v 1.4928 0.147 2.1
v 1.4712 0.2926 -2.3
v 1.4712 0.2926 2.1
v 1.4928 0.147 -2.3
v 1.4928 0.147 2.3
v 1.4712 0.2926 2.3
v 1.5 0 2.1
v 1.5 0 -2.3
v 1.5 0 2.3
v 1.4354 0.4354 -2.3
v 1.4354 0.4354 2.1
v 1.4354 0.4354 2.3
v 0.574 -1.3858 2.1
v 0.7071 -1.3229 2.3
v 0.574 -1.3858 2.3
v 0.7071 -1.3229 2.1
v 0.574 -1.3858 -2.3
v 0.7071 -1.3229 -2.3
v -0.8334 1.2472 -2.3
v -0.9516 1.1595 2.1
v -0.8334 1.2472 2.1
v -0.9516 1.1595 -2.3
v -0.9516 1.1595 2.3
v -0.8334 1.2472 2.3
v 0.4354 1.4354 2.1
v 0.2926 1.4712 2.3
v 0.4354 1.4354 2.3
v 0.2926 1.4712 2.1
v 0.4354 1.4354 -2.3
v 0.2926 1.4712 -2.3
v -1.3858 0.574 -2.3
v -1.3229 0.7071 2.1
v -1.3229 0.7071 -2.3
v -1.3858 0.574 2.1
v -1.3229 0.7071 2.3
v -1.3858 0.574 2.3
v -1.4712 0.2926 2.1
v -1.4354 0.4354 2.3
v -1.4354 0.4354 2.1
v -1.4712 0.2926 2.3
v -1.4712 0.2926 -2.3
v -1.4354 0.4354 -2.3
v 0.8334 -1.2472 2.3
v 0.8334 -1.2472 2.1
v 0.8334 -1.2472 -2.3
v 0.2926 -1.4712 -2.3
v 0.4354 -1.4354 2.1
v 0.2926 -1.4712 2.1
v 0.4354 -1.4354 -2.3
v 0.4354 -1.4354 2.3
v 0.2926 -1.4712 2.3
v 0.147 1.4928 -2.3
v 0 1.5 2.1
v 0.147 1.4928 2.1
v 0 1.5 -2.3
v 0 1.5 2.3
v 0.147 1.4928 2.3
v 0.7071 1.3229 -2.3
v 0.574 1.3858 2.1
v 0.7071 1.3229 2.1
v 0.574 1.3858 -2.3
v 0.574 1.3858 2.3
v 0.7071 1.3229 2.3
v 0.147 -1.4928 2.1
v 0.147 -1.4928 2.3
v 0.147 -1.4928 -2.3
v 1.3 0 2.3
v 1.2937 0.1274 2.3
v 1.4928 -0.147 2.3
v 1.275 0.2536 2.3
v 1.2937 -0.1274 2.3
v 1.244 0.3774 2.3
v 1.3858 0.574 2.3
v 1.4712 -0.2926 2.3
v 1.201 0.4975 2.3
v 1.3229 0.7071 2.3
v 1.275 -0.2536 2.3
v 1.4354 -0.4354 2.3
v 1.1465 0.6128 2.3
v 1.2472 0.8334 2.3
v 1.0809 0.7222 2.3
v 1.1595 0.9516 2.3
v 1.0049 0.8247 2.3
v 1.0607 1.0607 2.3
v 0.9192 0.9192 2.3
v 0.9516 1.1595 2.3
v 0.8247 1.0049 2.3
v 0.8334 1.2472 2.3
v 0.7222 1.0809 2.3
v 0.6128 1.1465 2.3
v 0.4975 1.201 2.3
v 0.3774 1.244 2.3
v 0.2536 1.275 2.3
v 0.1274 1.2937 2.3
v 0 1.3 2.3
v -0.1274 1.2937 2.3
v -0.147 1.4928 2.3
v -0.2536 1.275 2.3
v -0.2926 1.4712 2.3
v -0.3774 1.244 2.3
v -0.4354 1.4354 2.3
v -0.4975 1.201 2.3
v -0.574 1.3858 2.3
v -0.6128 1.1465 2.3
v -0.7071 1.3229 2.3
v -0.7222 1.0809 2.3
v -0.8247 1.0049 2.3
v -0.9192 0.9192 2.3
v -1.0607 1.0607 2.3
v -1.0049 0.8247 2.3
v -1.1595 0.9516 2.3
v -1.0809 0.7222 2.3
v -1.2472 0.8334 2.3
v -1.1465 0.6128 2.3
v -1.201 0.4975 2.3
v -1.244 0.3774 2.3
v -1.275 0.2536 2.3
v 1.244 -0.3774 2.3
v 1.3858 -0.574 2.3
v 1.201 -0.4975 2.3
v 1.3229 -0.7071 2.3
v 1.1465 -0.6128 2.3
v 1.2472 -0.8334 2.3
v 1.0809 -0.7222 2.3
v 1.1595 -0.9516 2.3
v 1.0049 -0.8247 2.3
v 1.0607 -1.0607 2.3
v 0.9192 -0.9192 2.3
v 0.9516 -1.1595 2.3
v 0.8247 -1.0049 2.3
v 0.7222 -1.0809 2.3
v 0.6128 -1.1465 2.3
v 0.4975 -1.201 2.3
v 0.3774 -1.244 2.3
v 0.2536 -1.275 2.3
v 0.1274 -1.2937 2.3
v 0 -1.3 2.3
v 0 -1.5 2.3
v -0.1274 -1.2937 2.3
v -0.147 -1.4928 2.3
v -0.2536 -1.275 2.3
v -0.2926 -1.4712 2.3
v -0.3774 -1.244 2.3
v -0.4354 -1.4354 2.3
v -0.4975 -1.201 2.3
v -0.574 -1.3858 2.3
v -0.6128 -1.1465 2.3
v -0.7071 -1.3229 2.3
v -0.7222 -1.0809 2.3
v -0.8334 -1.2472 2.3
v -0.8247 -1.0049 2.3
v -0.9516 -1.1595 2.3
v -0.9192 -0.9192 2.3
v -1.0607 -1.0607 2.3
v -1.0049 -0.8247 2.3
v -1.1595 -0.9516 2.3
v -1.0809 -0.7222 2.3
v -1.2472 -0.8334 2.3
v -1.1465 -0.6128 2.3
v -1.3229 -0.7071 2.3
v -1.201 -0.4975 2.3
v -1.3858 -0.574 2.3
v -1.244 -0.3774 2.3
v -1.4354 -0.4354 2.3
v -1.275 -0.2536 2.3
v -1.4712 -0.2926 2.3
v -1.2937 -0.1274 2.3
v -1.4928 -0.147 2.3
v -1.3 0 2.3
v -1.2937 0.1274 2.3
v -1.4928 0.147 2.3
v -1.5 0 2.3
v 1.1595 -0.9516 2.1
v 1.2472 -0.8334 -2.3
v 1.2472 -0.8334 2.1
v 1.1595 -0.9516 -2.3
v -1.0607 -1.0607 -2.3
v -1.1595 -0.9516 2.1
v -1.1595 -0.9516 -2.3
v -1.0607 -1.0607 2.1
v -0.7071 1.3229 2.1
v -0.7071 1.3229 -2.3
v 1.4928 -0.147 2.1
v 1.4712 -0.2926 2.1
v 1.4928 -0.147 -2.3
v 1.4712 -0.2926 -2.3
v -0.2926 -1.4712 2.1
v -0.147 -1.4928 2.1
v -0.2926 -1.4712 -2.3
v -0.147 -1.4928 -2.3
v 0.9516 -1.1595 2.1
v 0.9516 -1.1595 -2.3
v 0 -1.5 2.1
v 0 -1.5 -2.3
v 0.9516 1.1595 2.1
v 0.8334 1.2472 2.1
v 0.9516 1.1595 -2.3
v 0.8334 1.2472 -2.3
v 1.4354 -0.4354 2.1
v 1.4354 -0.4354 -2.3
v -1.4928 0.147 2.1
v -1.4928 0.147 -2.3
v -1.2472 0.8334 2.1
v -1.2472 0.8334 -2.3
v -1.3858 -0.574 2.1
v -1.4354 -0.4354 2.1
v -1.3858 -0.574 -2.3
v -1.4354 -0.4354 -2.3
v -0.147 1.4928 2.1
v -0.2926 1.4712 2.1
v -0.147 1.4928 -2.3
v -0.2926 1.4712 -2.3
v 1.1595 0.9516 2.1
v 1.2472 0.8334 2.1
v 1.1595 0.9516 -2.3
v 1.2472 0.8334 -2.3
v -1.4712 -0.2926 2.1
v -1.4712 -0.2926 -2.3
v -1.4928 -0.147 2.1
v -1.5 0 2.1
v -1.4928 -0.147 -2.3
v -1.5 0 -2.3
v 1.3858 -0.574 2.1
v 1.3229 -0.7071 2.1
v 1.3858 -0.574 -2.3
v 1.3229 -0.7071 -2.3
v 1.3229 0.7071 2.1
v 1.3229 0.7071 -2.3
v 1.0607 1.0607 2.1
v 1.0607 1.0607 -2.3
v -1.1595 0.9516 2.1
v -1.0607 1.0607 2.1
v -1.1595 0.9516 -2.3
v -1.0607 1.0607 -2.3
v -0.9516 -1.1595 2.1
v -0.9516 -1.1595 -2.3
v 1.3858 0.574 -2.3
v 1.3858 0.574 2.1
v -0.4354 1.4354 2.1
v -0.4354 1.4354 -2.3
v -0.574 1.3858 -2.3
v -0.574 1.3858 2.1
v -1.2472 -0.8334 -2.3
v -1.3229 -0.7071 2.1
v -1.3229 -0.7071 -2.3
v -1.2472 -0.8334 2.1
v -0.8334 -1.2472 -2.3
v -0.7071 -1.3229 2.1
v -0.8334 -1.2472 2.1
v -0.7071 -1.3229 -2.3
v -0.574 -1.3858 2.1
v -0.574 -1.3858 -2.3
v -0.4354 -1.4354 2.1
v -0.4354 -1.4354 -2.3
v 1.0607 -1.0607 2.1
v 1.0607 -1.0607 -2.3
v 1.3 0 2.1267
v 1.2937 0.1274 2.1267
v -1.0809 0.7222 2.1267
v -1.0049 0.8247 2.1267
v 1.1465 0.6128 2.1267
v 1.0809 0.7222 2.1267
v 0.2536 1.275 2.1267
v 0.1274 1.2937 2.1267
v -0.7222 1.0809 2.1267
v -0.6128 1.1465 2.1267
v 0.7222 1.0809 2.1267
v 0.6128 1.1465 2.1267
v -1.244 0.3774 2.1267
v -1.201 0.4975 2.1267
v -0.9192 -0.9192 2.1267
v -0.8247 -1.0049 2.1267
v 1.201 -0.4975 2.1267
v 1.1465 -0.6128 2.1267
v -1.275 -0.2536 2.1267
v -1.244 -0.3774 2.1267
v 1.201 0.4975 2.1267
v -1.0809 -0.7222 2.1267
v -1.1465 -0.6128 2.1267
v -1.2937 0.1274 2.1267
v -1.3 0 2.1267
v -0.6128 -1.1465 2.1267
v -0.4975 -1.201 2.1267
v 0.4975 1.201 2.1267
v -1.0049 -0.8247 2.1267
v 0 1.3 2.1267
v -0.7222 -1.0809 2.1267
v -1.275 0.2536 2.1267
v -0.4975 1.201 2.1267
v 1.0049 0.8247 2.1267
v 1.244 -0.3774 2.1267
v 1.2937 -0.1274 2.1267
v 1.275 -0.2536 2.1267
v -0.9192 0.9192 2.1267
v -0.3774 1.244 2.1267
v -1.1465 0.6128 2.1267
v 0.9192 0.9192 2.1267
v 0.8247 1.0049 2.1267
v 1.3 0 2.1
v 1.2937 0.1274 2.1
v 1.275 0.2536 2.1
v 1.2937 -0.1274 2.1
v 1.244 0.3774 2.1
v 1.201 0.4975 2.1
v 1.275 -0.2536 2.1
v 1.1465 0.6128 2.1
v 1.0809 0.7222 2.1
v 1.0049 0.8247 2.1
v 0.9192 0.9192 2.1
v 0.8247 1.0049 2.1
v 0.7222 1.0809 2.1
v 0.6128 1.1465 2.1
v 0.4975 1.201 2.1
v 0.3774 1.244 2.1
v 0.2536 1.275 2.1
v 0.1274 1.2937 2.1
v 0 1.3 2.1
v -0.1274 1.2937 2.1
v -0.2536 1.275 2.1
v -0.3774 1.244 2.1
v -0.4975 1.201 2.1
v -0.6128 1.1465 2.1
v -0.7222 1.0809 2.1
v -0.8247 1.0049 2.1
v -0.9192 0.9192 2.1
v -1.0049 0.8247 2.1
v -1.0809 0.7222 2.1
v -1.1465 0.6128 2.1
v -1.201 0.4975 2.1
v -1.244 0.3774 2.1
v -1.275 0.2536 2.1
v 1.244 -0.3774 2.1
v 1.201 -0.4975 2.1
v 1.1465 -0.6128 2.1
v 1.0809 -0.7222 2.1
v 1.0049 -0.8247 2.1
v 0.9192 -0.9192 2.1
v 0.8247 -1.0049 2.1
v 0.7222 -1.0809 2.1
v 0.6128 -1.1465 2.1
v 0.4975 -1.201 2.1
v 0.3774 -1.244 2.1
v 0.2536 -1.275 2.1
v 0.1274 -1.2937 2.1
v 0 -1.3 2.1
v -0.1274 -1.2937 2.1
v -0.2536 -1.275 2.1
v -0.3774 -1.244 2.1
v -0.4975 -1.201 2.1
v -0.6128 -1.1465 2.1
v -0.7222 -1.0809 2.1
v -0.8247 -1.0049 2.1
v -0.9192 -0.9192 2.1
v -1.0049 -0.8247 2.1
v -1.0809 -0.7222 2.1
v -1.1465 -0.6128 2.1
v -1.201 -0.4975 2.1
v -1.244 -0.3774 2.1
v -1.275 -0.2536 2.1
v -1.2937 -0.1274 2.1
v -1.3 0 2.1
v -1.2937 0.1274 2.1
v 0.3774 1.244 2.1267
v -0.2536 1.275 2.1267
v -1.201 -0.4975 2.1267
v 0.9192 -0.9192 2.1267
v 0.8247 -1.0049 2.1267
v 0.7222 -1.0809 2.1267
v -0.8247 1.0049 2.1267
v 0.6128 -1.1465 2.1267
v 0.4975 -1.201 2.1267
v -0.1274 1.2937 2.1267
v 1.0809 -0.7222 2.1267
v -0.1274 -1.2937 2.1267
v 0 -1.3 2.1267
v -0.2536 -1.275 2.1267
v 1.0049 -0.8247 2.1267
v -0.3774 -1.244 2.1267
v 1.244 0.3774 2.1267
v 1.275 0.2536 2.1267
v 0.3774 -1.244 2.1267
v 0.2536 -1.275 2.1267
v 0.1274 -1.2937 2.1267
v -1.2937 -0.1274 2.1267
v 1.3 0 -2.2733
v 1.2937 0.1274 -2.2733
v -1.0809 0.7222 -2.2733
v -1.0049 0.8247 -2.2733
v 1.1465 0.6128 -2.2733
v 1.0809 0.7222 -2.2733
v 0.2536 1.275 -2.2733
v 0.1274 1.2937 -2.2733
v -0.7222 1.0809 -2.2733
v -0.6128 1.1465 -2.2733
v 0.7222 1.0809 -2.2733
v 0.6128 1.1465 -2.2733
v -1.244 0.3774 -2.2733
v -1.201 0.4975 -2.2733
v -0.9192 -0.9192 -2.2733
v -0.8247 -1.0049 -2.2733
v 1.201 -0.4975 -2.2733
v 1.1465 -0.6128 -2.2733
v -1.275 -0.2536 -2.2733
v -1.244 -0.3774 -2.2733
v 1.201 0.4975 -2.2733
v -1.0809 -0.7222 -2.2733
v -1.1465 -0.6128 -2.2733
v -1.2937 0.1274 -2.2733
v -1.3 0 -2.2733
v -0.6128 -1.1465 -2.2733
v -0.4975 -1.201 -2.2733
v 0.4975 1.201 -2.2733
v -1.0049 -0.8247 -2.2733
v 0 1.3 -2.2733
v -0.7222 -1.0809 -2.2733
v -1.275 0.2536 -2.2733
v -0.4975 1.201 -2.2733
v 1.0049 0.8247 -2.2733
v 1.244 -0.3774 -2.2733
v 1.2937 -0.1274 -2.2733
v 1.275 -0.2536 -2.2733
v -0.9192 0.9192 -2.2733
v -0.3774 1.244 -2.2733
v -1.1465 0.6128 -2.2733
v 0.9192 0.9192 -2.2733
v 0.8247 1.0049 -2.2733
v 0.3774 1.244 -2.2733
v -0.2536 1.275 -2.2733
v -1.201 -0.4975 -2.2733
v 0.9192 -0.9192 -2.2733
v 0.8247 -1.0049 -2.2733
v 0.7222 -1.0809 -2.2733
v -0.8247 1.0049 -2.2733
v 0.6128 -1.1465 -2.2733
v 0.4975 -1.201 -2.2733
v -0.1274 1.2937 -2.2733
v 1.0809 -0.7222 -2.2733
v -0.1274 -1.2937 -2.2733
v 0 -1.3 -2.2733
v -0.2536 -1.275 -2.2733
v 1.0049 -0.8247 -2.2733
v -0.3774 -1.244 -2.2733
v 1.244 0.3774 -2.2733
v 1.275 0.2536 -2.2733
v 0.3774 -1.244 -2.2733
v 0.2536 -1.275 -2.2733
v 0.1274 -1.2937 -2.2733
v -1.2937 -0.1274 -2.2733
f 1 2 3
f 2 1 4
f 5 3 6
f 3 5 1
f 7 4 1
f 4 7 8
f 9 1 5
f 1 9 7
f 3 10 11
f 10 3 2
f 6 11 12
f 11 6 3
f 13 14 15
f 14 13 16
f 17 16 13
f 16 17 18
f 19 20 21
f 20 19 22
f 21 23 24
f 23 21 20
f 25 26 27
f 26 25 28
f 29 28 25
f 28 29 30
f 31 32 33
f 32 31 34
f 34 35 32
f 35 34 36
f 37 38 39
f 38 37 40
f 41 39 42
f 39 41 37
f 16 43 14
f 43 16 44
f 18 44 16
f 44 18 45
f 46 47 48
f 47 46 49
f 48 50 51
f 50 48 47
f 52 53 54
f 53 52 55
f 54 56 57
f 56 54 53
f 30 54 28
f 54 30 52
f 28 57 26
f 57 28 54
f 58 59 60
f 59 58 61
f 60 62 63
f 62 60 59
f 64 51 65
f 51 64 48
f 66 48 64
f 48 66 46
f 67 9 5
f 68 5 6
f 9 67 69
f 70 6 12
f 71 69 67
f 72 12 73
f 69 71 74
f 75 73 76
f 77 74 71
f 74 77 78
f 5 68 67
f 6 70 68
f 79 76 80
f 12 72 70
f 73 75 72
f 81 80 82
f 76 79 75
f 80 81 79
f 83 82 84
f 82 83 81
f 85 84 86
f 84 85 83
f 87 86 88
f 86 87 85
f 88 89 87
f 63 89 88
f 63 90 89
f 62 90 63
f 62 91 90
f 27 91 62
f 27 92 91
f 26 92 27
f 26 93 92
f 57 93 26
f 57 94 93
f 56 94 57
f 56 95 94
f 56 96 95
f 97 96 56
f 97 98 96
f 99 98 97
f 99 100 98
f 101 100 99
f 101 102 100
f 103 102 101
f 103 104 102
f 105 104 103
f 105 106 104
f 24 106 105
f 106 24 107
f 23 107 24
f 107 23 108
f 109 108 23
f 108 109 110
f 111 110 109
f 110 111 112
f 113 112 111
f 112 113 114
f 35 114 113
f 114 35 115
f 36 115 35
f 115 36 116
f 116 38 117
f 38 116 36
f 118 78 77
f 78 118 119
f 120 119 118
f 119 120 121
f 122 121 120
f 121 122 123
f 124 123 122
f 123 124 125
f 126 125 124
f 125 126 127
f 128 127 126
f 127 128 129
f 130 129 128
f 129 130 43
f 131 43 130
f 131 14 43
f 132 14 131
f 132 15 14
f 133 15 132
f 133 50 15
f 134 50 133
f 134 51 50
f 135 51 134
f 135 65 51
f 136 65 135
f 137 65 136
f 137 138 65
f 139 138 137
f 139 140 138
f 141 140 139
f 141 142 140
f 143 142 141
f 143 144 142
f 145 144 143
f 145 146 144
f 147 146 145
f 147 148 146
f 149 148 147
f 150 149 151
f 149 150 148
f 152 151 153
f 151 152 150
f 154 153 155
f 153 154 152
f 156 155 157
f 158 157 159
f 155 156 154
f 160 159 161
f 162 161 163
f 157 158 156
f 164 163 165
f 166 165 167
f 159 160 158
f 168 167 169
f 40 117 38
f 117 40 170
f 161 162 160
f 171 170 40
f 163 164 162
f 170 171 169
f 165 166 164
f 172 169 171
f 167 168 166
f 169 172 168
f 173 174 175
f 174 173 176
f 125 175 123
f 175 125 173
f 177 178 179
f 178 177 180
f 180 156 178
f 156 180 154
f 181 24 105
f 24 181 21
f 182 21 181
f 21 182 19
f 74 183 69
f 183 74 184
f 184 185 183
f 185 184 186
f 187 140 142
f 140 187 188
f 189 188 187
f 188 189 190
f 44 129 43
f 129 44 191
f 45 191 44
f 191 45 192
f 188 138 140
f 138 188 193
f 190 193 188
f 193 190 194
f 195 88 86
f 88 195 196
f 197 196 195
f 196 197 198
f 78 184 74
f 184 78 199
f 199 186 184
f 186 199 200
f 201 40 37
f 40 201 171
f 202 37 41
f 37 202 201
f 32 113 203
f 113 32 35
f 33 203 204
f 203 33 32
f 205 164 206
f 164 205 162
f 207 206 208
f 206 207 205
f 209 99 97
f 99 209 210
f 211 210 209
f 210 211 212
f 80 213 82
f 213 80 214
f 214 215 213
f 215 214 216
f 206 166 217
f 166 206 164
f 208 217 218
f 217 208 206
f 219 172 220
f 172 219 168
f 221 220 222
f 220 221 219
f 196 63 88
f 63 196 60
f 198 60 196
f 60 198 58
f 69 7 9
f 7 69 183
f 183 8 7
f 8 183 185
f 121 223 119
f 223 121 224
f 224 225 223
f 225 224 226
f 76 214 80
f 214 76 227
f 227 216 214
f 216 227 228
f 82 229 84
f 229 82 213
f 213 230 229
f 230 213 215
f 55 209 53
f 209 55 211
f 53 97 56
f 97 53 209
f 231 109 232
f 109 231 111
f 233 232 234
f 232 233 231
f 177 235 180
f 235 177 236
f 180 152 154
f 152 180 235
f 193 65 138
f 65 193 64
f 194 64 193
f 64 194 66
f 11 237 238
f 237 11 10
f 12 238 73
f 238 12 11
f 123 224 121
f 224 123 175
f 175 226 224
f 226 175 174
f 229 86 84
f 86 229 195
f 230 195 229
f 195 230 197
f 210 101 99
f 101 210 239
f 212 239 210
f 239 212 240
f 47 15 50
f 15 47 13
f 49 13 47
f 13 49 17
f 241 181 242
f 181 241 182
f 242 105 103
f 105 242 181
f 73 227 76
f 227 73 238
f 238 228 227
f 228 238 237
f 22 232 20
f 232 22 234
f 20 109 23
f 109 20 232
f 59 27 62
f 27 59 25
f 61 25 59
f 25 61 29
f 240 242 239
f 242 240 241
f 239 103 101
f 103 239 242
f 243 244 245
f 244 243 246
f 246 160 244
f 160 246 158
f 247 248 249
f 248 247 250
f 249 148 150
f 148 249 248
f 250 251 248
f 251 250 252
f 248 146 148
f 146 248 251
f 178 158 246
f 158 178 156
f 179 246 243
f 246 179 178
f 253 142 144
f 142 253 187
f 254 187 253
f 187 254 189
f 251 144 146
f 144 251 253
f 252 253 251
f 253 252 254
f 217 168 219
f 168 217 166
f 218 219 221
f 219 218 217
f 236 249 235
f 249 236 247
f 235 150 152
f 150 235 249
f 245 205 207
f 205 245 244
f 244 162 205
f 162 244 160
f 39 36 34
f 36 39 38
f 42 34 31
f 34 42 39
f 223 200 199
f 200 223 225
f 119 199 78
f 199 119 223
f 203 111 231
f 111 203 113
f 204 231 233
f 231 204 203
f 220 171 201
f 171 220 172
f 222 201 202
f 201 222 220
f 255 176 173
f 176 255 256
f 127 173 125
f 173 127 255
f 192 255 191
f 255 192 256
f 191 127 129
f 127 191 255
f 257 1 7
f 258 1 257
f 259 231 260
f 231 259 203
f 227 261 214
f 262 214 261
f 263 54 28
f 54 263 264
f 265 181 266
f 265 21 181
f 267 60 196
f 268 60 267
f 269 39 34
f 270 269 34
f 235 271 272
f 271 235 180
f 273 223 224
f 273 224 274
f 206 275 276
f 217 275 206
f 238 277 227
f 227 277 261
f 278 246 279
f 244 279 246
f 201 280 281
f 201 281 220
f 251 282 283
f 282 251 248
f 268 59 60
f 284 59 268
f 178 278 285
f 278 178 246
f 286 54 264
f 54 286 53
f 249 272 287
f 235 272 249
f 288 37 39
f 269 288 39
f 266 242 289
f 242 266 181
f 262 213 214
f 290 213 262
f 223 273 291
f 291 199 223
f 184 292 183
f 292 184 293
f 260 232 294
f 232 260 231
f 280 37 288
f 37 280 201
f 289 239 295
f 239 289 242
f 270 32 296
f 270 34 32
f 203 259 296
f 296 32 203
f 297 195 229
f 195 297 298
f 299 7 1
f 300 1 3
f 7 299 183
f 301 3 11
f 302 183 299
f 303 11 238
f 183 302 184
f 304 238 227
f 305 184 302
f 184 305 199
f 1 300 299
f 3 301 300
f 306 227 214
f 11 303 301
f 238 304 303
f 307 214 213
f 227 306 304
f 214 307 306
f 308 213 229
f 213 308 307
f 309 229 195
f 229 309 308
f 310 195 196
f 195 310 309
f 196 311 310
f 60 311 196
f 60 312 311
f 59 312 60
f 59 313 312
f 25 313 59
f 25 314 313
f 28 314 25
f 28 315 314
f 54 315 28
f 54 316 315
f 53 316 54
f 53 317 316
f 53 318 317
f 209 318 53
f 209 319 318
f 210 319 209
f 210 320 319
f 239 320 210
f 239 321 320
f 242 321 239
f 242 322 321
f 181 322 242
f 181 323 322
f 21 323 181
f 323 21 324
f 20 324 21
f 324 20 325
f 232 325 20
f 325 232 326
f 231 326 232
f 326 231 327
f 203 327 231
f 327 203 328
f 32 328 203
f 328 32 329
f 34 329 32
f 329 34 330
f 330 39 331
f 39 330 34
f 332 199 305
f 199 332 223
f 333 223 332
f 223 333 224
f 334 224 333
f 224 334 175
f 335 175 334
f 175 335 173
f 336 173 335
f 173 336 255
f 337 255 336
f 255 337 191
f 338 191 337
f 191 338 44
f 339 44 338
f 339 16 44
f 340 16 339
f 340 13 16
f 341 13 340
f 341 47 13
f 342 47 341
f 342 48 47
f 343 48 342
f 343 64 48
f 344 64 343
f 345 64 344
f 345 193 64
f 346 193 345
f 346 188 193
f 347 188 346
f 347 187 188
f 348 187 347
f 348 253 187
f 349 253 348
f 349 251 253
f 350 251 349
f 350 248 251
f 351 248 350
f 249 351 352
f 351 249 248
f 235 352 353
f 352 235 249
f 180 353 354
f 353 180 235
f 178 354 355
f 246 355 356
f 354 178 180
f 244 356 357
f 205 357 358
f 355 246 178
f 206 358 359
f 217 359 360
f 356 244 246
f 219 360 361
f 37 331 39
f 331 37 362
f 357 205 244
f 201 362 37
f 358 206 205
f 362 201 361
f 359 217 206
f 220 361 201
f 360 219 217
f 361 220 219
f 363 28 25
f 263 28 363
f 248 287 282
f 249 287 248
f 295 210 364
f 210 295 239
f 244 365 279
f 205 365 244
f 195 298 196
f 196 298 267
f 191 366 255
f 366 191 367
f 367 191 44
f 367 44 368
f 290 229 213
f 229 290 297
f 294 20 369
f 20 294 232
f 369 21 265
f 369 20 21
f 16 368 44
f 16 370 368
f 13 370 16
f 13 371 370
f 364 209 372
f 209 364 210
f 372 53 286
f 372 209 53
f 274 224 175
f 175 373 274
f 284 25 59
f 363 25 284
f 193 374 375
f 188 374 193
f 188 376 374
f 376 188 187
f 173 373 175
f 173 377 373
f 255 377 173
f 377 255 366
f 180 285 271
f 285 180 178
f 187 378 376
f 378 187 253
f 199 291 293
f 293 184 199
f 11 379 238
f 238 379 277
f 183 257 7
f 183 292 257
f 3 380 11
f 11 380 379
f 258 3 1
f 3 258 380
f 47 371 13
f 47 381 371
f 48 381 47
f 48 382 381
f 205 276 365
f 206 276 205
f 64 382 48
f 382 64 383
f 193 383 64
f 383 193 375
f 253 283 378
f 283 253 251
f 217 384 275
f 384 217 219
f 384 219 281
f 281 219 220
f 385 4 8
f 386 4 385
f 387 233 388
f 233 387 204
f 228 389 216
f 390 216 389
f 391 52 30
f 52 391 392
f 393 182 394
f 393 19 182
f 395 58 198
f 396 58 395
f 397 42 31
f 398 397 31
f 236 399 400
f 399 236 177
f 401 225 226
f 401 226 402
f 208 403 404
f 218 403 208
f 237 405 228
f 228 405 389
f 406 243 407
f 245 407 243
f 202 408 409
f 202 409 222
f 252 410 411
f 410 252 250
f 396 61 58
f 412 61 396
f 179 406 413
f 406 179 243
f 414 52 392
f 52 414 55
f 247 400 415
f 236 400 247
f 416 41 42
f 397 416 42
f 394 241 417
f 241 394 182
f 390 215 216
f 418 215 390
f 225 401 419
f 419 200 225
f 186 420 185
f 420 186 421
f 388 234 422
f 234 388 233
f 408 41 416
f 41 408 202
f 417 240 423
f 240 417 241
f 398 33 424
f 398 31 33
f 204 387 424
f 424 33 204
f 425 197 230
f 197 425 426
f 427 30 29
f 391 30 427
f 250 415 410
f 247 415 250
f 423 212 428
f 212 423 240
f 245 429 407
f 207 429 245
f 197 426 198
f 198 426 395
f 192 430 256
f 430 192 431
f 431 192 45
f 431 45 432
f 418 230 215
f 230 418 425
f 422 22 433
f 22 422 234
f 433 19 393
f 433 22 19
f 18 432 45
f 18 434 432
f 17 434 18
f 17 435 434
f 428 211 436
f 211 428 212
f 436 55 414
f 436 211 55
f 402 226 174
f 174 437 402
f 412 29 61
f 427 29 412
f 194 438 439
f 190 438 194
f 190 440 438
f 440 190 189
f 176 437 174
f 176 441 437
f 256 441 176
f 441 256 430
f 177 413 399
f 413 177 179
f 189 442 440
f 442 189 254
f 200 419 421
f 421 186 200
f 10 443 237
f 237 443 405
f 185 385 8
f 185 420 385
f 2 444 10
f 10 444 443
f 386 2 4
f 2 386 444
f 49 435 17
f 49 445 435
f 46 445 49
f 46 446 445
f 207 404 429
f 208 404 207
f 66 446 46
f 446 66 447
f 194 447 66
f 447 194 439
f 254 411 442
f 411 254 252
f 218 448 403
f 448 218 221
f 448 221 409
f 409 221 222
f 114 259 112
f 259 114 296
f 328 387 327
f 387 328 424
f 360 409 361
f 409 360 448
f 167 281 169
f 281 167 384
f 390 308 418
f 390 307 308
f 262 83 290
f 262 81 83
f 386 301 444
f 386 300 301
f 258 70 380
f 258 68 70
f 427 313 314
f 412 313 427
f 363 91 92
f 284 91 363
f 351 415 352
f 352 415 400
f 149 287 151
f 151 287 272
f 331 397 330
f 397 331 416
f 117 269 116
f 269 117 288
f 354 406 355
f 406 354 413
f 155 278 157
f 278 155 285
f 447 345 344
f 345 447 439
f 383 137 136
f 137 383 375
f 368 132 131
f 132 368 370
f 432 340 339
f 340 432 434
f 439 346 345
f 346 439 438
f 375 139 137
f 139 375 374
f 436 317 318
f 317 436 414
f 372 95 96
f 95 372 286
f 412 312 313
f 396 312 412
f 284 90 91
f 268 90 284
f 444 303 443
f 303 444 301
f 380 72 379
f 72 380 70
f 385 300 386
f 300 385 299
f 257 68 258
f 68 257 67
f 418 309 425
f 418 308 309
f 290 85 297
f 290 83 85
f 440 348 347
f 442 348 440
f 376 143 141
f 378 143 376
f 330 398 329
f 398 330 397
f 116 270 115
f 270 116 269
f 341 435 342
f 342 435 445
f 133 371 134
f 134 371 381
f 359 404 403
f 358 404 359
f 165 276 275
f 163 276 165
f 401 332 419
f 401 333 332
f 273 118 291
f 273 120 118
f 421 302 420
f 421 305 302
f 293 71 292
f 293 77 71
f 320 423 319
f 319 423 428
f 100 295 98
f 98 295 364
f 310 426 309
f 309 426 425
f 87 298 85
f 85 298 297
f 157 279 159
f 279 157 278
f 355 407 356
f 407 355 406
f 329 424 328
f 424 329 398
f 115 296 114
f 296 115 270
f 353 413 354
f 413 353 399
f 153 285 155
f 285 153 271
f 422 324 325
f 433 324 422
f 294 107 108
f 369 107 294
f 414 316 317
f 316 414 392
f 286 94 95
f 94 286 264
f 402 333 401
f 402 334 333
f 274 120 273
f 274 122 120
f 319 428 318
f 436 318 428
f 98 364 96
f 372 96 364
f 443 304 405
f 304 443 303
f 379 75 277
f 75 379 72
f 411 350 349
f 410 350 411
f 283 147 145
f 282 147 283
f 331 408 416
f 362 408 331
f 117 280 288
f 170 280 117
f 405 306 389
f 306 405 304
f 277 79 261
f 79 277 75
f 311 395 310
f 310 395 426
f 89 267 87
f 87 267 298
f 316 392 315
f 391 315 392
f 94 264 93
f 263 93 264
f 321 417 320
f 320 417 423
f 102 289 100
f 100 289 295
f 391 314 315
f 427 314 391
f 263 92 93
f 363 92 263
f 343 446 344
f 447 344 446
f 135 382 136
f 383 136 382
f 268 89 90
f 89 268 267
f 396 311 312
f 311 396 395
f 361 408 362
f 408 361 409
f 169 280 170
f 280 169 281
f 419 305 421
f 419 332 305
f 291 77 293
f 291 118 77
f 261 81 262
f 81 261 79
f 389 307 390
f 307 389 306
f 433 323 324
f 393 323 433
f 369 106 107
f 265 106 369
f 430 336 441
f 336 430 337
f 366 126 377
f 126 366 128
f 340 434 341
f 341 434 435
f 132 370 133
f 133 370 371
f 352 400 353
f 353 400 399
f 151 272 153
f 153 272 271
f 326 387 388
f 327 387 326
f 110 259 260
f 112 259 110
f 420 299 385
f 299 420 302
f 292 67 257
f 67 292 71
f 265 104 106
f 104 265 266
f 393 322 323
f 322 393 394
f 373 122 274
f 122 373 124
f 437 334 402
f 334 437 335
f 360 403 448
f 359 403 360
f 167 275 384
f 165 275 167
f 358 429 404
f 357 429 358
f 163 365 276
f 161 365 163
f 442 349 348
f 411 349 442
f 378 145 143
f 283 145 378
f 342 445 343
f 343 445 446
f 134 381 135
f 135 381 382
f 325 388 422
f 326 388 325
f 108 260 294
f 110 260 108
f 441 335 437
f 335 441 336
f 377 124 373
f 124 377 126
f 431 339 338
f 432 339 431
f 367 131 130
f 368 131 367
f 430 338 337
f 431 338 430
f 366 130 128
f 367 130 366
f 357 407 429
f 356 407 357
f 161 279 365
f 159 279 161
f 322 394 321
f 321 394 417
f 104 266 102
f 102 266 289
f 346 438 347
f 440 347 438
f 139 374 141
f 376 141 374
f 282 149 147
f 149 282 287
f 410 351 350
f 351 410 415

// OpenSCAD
// Parameters
outer_diameter_mm = 3.0; //[1.5:6.0:0.1]
length_mm = 4.6; //[2.3:9.2:0.1]
screw_nominal_diameter_mm = 3.0; //[1.5:6.0:0.1]
internal_thread_pitch_mm = 0.5; //[0.25:1.0:0.05]
internal_thread_class = 6; //[4:8:1]
lead_in_chamfer_angle_deg = 30; //[15:60:1]
end_chamfer_mm = 0.2; //[0.1:0.6:0.05]
thread_minor_diameter_mm = 2.5; //[2.2:2.8:0.05]
thread_bore_extra_clearance_mm = 0.1; //[0.0:0.3:0.05]
overlap_mm = 0.8; //[0.5:2.0:0.1]

// Threaded Insert - complete geometry
module threaded_insert() {
  color("Brass") {
    difference() {
      // Insert body
      translate([0, 0, 0])
        cylinder(r=outer_diameter_mm/2, h=length_mm, center=true, $fn=64);
      
      // Installation lead-in chamfer
      translate([0, 0, length_mm/2 - end_chamfer_mm/2])
        cylinder(r1=outer_diameter_mm/2, r2=0, h=end_chamfer_mm, center=true, $fn=64);
      
      // End face chamfer
      translate([0, 0, -length_mm/2 + end_chamfer_mm/2])
        cylinder(r1=outer_diameter_mm/2, r2=0, h=end_chamfer_mm, center=true, $fn=64);
      
      // Internal thread bore
      translate([0, 0, 0])
        cylinder(r=(thread_minor_diameter_mm + thread_bore_extra_clearance_mm)/2, h=length_mm + 2*overlap_mm, center=true, $fn=64);
    }
  }
}

// Assembly
module assembly() {
  threaded_insert();
}

assembly();
